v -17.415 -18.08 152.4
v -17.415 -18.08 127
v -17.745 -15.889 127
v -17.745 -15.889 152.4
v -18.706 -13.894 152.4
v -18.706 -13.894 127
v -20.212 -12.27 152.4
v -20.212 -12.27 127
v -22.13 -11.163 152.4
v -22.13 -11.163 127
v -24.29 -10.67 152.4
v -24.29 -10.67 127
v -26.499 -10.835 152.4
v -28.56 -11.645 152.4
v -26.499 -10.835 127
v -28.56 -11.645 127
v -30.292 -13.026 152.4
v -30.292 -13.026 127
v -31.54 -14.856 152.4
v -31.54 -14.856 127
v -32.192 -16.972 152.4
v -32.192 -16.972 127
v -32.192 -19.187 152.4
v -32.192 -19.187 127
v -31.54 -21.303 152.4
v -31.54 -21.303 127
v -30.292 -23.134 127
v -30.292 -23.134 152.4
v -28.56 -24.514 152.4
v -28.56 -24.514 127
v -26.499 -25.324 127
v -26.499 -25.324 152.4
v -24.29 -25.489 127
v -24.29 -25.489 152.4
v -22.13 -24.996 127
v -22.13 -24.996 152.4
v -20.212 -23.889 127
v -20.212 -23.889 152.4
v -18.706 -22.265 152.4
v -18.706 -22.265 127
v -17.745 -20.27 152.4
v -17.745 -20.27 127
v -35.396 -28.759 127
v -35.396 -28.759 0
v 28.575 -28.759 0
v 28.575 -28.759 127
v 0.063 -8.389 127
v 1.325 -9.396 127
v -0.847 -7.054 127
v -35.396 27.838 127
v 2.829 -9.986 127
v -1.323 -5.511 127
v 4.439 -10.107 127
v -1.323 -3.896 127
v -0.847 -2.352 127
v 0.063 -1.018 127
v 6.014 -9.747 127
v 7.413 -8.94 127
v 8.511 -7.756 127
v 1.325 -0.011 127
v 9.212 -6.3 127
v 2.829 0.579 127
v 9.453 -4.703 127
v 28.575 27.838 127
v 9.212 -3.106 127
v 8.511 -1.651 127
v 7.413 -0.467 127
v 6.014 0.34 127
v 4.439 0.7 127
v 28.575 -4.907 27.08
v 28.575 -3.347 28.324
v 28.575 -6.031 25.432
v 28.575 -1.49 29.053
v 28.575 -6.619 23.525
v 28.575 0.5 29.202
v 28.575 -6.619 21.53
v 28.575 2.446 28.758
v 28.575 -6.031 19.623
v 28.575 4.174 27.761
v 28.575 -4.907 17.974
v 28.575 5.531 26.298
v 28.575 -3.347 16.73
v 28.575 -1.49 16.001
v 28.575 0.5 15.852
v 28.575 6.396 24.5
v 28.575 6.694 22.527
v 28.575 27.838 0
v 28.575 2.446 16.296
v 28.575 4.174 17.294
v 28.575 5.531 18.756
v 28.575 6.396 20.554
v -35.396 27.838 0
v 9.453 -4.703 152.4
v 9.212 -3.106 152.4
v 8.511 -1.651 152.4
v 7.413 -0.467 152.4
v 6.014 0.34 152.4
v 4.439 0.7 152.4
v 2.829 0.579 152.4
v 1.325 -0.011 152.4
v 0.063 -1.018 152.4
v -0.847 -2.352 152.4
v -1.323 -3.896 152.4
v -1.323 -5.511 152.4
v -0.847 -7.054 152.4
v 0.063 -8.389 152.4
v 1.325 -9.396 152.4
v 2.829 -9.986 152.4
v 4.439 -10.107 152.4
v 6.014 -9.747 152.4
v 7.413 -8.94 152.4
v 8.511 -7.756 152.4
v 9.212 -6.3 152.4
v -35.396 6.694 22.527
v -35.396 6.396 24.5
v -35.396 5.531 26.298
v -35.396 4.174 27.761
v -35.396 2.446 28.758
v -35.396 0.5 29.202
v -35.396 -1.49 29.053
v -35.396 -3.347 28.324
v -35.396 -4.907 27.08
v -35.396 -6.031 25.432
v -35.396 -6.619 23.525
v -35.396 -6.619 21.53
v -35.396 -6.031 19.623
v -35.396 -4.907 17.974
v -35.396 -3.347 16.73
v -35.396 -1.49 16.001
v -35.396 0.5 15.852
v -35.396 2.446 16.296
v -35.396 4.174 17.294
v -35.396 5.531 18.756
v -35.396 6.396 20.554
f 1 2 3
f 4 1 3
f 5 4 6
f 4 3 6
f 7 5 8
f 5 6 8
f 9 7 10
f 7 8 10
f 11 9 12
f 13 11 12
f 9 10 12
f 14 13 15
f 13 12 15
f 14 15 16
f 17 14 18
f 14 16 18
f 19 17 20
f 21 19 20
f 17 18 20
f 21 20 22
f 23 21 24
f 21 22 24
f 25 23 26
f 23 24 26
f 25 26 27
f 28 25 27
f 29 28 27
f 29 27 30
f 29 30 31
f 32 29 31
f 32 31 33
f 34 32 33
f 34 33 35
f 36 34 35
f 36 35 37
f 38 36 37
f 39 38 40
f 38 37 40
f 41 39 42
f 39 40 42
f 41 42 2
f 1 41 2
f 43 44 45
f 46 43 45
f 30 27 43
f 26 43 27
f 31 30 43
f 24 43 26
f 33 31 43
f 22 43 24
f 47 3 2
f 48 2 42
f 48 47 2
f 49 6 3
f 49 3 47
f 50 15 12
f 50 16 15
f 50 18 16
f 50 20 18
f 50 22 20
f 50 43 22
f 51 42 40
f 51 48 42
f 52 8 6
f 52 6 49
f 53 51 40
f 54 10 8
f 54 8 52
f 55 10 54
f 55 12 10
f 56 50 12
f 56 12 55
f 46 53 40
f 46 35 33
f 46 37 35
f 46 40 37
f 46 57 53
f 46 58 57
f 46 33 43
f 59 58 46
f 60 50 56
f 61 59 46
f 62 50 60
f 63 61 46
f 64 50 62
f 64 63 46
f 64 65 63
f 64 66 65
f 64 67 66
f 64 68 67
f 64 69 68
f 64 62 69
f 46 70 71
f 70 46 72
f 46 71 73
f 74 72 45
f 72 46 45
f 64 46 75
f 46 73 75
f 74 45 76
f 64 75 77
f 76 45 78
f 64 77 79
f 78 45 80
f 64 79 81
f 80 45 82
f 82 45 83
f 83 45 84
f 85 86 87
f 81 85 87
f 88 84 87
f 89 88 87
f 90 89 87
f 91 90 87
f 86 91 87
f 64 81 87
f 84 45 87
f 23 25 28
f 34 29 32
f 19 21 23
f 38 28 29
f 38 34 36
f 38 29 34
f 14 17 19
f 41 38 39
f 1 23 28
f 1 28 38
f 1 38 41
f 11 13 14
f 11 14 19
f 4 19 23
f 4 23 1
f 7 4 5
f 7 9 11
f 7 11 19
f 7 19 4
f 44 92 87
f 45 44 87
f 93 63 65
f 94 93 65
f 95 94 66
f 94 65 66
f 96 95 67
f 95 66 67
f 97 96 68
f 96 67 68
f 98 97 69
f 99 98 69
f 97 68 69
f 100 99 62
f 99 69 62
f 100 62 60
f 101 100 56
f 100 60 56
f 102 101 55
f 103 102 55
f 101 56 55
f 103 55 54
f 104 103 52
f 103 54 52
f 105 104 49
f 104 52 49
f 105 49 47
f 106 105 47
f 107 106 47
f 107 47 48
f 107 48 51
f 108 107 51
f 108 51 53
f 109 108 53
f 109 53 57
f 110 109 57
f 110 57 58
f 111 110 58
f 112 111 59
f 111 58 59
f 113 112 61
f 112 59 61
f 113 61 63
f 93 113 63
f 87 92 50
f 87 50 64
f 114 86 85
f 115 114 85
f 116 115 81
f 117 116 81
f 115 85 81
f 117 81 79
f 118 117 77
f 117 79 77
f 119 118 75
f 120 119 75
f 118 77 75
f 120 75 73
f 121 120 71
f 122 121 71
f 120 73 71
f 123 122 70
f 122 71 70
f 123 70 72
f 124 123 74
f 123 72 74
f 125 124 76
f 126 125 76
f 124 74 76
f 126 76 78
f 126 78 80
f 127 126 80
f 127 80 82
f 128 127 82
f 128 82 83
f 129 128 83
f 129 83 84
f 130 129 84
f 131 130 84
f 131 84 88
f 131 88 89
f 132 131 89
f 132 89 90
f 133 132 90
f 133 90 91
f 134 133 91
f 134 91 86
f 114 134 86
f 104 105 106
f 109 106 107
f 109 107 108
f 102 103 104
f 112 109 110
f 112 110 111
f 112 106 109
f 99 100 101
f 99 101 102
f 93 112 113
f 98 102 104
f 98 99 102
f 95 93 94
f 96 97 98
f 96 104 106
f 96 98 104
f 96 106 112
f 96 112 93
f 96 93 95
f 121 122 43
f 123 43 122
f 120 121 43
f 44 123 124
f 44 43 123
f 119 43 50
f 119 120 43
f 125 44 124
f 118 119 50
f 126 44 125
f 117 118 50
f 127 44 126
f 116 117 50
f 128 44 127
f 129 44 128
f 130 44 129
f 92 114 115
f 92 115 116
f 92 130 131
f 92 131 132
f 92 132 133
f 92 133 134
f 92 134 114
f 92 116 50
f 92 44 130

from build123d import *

# Parameters (mm, degrees)
F0_W     = 63.97113
F0_H     = 56.596935
F1_DEPTH = 127
F2_R     = 5.418349
F3_DEPTH = 25.4
F4_R     = 6.69388
F5_DEPTH = 85.09
F6_R     = 7.430381
F7_DEPTH = 25.4


with BuildPart() as f1:
    # F0 (on Top) → F1 (new body)
    with BuildSketch(Plane.XY):
        with Locations((-3.410564, -0.460888)):
            Rectangle(F0_W, F0_H)
    extrude(amount=F1_DEPTH)

    # F2 (on face) → F3 (join)
    with BuildSketch(Plane.XY.offset(127)):
        with Locations((4.034519, -4.703406)):
            Circle(F2_R)
    extrude(amount=F3_DEPTH)

    # F4 (on face) → F5 (cut)
    with BuildSketch(Plane.YZ.offset(28.575001)):
        with Locations((0, 22.527253)):
            Circle(F4_R)
    extrude(amount=-F5_DEPTH, mode=Mode.SUBTRACT)

    # F6 (on face) → F7 (join)
    with BuildSketch(Plane.XY.offset(127)):
        with Locations((-24.845107, -18.07957)):
            Circle(F6_R)
    extrude(amount=F7_DEPTH)


solid = f1.part
